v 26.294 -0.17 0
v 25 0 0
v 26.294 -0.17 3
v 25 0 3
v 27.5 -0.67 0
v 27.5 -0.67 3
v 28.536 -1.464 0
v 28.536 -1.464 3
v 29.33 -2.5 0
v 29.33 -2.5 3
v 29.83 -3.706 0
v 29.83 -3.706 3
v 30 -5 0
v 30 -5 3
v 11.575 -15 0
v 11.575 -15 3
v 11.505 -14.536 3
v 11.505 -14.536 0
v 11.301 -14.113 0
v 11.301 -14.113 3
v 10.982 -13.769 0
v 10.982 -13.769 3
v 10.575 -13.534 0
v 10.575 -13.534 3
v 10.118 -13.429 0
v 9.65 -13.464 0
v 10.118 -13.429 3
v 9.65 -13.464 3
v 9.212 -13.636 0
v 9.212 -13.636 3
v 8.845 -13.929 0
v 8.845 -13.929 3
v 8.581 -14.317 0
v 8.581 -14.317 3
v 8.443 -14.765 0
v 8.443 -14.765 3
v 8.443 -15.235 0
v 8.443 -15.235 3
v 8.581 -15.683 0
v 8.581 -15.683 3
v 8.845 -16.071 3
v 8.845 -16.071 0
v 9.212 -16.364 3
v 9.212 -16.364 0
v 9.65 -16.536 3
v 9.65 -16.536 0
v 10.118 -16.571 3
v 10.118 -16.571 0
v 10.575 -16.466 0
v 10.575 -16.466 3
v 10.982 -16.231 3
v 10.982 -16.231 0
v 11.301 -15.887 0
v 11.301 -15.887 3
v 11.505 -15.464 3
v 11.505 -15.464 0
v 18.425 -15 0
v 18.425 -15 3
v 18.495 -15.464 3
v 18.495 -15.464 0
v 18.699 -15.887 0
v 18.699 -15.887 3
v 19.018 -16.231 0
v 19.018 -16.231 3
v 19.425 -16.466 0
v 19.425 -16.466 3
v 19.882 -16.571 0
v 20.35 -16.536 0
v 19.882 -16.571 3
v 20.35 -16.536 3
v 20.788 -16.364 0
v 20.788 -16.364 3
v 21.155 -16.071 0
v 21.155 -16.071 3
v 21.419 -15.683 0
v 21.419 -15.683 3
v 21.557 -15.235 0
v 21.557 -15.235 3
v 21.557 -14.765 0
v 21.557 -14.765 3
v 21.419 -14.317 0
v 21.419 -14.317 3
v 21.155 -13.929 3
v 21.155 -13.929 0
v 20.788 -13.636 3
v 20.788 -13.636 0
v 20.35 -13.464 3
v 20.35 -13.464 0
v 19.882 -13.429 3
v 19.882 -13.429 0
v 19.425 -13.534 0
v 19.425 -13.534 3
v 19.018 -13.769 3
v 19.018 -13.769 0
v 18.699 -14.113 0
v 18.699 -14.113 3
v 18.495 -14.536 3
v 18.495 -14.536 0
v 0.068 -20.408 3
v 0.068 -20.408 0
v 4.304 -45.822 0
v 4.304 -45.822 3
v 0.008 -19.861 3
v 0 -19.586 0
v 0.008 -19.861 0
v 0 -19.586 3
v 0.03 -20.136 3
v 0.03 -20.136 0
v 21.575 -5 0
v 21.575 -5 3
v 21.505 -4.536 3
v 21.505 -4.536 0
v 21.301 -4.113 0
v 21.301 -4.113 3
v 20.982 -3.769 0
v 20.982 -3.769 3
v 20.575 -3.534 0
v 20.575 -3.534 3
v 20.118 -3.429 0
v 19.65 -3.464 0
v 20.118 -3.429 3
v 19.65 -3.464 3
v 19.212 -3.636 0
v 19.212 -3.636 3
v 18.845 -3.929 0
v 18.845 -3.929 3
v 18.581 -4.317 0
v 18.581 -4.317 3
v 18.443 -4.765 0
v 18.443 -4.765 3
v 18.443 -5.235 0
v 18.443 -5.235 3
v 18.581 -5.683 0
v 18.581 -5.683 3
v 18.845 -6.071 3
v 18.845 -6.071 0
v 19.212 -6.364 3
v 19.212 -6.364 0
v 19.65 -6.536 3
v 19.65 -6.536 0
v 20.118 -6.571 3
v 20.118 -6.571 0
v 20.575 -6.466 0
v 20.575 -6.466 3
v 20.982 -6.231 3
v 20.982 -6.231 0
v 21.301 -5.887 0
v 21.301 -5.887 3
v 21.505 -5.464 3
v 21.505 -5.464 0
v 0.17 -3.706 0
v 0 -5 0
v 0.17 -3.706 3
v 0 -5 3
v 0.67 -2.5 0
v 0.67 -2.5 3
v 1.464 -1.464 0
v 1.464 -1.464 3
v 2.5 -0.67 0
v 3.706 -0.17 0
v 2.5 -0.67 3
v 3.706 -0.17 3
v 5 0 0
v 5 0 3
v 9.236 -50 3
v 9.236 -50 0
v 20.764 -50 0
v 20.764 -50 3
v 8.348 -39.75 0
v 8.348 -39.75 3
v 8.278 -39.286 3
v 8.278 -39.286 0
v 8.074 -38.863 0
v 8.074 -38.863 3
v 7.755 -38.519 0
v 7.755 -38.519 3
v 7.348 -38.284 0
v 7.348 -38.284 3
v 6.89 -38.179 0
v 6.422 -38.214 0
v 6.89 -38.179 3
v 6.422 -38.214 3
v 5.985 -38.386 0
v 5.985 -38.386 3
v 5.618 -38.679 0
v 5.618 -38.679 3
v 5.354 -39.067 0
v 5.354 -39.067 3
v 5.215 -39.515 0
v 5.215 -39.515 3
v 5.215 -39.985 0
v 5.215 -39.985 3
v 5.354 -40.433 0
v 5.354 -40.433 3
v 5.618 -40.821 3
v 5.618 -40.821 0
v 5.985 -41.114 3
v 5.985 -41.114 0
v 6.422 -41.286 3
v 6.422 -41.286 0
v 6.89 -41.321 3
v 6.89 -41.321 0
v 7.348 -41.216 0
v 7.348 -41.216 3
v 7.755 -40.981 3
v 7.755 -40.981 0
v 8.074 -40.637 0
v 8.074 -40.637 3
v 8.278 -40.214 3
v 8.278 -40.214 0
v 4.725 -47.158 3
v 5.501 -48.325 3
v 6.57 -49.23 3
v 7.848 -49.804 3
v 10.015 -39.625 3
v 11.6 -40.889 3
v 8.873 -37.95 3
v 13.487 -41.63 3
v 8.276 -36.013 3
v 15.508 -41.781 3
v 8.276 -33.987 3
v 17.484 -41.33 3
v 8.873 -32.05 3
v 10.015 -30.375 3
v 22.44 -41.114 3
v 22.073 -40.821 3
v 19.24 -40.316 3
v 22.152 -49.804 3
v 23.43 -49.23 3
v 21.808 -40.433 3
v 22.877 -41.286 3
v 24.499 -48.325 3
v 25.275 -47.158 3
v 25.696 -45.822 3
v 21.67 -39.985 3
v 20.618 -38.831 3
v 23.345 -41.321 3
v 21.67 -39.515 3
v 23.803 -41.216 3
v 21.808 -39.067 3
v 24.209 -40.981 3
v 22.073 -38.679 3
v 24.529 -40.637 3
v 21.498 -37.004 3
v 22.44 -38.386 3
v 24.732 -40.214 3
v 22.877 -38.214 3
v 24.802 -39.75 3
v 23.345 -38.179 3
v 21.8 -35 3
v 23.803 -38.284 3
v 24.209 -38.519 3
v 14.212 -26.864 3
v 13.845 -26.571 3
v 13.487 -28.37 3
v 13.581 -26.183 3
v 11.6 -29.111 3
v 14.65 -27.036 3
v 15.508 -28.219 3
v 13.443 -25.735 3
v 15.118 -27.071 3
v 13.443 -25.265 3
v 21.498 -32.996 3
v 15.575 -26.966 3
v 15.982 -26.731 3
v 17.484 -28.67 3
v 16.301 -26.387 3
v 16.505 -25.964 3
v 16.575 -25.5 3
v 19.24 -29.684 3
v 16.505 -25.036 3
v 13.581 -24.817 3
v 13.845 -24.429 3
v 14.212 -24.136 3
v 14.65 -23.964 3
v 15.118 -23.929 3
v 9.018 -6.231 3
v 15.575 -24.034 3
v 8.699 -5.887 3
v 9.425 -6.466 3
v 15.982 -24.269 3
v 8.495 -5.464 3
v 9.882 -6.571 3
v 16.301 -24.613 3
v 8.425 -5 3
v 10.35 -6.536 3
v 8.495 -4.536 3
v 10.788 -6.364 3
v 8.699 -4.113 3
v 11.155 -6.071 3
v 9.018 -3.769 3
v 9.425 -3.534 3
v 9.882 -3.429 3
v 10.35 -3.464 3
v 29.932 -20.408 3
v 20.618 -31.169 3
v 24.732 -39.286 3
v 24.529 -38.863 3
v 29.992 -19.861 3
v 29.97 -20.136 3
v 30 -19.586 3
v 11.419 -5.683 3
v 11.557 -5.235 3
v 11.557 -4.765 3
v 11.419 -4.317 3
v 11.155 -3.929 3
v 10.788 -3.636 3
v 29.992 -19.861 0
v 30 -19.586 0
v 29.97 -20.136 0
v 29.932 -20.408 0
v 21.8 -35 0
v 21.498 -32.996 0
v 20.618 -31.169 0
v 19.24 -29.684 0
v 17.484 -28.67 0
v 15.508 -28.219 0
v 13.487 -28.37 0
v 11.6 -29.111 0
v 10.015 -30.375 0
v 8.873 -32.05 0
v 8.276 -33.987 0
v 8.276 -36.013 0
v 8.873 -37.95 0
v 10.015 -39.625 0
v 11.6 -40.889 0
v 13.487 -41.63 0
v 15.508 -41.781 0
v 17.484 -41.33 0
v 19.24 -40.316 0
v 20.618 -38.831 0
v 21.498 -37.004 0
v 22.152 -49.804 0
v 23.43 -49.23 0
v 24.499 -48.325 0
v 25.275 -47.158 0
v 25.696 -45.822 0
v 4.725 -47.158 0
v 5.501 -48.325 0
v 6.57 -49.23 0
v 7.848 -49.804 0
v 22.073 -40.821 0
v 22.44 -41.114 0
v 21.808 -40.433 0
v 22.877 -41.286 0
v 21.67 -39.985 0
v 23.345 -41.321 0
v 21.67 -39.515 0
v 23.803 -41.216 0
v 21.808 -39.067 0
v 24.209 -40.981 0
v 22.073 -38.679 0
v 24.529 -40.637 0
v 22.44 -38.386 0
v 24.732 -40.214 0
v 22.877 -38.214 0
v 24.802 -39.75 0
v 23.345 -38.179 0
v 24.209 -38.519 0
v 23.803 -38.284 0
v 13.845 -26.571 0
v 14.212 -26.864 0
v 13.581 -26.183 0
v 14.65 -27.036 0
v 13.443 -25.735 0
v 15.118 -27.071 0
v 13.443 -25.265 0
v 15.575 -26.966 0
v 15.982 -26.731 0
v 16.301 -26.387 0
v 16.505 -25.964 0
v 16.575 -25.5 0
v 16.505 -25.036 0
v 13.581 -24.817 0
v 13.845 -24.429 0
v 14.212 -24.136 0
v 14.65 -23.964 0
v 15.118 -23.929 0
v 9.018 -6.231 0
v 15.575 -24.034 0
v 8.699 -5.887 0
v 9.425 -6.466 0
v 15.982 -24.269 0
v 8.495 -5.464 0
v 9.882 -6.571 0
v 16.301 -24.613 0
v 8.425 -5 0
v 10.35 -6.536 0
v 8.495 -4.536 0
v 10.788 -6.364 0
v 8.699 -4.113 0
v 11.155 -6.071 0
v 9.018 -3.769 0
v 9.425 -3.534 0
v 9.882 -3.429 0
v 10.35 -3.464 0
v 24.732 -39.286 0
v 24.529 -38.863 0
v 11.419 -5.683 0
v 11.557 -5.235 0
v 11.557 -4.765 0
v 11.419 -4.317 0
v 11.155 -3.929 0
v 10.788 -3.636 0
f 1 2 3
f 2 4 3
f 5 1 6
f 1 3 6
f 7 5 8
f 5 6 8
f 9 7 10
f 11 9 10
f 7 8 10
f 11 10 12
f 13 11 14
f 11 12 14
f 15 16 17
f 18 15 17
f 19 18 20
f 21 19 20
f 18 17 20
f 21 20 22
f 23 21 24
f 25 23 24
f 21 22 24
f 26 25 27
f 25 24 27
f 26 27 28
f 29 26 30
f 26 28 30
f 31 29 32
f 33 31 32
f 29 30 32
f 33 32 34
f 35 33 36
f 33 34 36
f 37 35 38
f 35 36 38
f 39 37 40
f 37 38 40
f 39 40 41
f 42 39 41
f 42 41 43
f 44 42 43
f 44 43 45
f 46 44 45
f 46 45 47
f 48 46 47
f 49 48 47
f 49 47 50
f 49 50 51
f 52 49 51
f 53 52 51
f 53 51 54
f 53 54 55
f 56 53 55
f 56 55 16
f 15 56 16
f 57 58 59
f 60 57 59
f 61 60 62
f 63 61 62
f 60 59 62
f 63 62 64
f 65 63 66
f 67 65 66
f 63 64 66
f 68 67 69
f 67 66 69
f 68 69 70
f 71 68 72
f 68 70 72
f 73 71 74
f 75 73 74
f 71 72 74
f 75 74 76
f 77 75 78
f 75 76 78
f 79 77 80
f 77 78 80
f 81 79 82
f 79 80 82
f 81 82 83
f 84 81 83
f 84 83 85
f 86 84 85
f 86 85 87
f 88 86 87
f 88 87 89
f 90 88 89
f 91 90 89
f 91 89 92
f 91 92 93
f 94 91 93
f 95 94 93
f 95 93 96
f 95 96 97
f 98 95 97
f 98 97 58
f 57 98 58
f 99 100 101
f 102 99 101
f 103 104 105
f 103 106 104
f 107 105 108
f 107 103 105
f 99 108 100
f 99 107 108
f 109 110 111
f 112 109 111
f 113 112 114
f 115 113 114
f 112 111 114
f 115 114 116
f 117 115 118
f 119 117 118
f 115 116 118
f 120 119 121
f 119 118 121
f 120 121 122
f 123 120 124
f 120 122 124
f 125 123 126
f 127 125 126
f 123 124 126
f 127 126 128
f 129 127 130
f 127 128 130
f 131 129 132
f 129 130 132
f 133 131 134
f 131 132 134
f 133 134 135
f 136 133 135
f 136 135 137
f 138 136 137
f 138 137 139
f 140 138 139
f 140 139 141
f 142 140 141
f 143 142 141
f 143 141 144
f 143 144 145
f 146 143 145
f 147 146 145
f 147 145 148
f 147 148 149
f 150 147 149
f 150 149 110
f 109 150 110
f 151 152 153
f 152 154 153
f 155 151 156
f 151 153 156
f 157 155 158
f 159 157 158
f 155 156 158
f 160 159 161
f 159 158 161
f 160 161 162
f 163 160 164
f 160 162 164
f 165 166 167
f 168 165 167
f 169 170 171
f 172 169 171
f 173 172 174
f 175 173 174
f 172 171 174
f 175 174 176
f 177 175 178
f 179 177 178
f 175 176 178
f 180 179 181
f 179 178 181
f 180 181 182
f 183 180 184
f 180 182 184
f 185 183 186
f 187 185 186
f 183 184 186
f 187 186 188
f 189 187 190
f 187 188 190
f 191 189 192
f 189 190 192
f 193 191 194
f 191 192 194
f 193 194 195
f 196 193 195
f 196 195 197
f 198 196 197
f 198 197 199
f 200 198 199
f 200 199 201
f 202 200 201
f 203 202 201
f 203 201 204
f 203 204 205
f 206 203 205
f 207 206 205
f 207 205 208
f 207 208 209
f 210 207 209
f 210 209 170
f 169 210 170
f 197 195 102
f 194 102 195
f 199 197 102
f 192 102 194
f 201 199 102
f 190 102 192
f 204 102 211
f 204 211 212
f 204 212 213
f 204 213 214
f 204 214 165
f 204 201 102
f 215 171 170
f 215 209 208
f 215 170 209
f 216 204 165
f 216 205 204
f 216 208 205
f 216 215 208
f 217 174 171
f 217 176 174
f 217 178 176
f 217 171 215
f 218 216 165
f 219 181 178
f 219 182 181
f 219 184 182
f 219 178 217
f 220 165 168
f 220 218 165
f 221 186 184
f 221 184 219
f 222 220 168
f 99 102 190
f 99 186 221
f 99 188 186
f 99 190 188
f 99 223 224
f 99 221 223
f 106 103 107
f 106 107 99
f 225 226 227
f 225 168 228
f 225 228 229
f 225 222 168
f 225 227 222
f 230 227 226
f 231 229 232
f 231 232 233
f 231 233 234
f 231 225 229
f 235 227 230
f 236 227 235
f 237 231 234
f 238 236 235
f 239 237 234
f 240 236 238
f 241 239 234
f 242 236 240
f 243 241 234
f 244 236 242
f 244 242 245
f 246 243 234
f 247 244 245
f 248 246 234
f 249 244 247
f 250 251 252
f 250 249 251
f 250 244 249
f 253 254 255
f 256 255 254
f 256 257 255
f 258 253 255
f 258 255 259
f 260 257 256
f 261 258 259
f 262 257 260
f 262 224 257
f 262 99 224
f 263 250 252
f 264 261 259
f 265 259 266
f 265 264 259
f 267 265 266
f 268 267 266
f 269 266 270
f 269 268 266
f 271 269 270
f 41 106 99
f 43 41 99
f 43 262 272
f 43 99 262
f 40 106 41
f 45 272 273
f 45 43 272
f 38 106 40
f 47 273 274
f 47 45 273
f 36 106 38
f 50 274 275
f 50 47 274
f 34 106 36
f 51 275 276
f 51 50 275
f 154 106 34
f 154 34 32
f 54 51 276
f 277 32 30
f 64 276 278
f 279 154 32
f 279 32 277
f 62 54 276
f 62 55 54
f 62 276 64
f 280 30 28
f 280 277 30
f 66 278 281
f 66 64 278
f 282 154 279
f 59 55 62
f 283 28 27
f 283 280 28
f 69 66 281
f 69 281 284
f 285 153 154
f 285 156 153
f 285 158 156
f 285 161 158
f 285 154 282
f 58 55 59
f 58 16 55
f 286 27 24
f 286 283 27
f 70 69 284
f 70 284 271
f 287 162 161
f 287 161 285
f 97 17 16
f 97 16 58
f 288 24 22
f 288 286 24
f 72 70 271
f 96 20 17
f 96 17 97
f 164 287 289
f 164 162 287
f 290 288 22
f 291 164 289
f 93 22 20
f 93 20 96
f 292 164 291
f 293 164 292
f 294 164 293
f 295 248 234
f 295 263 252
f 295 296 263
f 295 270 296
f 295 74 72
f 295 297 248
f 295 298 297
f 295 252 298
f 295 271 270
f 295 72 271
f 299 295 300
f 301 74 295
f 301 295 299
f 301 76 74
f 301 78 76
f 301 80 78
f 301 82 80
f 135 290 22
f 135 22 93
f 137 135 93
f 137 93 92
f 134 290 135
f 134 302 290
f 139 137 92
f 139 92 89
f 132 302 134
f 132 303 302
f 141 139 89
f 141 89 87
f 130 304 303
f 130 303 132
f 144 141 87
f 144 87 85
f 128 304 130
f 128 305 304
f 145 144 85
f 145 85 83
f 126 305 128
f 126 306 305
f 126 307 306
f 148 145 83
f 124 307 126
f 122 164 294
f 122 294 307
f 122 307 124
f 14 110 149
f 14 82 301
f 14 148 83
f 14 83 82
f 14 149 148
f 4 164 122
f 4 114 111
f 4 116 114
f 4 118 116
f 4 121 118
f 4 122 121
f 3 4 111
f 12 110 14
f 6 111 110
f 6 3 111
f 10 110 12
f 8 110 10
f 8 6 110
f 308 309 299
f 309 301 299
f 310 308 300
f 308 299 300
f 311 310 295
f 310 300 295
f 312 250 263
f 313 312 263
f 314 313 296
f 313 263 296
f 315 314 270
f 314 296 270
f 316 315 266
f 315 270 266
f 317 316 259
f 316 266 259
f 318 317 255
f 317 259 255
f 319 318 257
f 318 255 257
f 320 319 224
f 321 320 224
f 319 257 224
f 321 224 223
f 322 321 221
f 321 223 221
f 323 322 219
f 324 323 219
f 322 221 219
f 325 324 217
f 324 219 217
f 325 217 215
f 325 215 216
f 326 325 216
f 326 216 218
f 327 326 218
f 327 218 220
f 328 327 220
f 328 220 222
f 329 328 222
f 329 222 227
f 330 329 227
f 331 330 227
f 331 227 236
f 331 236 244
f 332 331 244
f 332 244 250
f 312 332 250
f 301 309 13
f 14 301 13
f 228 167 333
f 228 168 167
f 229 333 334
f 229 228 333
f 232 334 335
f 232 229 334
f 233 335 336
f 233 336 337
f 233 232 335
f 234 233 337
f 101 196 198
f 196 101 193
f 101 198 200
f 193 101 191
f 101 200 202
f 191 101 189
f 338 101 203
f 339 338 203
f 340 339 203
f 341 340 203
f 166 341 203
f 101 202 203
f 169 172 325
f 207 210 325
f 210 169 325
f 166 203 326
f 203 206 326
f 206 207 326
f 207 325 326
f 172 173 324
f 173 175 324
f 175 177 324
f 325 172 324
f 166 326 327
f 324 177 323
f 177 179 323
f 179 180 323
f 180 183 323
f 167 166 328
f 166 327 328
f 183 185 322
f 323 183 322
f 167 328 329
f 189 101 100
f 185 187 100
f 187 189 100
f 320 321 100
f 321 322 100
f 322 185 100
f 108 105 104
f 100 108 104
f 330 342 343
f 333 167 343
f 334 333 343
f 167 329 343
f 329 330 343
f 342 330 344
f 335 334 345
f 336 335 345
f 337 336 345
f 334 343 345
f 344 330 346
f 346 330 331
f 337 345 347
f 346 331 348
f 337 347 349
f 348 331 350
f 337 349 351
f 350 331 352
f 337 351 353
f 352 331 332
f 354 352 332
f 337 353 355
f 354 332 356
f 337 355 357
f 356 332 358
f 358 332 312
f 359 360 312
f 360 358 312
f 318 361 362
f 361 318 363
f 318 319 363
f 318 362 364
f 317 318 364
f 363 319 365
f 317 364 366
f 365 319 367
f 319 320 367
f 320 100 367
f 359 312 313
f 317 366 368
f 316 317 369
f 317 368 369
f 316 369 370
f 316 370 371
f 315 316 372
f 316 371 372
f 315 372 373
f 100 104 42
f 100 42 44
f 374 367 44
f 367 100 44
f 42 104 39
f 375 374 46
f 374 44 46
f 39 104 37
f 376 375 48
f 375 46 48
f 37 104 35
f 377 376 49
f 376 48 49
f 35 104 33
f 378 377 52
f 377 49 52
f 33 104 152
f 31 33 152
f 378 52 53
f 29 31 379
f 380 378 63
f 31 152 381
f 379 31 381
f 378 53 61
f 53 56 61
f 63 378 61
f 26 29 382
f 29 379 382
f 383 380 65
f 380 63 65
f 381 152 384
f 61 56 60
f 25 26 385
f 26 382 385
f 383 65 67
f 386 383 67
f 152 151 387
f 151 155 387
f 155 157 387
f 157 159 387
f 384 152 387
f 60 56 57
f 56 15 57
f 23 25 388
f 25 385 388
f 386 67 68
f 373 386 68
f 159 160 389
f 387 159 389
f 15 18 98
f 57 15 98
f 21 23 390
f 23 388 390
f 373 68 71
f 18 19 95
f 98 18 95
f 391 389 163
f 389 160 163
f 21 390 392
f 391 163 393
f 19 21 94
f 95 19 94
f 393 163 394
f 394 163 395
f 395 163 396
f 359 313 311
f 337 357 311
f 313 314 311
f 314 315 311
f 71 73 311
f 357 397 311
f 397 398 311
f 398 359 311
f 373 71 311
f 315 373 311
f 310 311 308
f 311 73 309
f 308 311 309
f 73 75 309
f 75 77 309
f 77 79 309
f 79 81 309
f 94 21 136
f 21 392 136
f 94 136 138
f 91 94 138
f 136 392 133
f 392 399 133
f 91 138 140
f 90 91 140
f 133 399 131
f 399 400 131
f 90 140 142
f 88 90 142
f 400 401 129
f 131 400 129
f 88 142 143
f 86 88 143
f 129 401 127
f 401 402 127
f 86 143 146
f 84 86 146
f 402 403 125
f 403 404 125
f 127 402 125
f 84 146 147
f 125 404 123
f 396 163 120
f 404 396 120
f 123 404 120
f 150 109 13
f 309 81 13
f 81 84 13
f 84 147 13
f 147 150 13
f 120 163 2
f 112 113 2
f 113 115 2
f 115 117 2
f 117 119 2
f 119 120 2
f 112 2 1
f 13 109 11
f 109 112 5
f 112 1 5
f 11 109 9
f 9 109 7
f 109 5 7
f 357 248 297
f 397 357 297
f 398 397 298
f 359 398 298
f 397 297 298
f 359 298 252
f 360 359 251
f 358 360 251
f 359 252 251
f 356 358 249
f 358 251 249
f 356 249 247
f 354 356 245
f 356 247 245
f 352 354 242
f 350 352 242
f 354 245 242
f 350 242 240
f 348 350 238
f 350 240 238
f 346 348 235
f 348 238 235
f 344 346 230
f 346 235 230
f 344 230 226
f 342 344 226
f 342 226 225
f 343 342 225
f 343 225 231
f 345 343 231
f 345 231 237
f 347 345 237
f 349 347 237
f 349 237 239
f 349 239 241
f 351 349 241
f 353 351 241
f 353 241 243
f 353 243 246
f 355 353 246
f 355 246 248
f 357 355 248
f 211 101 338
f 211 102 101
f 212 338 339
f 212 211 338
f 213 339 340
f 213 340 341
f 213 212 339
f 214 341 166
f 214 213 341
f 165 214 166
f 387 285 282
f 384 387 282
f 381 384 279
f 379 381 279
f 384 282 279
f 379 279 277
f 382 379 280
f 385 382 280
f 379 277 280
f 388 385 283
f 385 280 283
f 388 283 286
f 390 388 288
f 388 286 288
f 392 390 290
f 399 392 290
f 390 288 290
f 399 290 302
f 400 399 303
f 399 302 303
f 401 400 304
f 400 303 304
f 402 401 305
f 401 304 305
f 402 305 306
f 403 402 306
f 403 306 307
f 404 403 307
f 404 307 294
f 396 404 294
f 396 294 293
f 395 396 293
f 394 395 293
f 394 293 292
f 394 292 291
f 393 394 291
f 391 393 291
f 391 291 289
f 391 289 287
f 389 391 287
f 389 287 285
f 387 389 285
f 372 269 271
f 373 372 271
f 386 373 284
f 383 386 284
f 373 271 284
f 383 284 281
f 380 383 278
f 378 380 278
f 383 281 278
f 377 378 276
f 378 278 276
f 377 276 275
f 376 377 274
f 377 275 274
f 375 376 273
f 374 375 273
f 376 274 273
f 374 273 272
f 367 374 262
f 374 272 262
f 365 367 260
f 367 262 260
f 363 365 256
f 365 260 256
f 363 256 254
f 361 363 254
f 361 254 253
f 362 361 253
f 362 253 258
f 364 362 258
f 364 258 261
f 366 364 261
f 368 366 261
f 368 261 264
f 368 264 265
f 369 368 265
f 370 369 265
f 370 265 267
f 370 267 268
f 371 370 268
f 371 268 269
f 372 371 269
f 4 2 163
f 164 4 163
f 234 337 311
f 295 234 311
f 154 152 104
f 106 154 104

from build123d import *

# Parameters (mm, degrees)
EXTRUDE_1_DEPTH     = 3
SKETCH_2_R          = 1.575
SKETCH_2_R_2        = 6.8
CUT_EXTRUDE_2_DEPTH = 59.386642308
FILLET_1_R          = 5


with BuildPart() as part:
    # 草图1 → 凸台-拉伸1 (new body)
    with BuildSketch(Plane.XY):
        Polygon((0, 0), (0, -20), (5, -50), (25, -50), (30, -20), (30, 0), align=None)
    extrude(amount=EXTRUDE_1_DEPTH)

    # 草图2 → 切除-拉伸2 (cut, through all)
    with BuildSketch(Plane.XY.offset(3)):
        with Locations(Location((10, -5, 0), (0, 0, 180))):
            Circle(SKETCH_2_R)
        with Locations((10, -15)):
            Circle(SKETCH_2_R)
        with Locations(Location((20, -15, 0), (0, 0, 180))):
            Circle(SKETCH_2_R)
        with Locations((20, -5)):
            Circle(SKETCH_2_R)
        with Locations((15, -35)):
            Circle(SKETCH_2_R_2)
        with Locations((15, -25.5)):
            Circle(SKETCH_2_R)
        with Locations((23.227241336, -39.75)):
            Circle(SKETCH_2_R)
        with Locations((6.772758664, -39.75)):
            Circle(SKETCH_2_R)
    extrude(amount=-CUT_EXTRUDE_2_DEPTH, mode=Mode.SUBTRACT)

    # 圆角1
    fillet_1_edges = [part.edges().sort_by_distance(p)[0] for p in [
        (30, 0, 1.5),
        (30, -20, 1.5),
        (25, -50, 1.5),
        (5, -50, 1.5),
        (0, -20, 1.5),
        (0, 0, 1.5),
    ]]
    fillet(fillet_1_edges, radius=FILLET_1_R)


solid = part.part
